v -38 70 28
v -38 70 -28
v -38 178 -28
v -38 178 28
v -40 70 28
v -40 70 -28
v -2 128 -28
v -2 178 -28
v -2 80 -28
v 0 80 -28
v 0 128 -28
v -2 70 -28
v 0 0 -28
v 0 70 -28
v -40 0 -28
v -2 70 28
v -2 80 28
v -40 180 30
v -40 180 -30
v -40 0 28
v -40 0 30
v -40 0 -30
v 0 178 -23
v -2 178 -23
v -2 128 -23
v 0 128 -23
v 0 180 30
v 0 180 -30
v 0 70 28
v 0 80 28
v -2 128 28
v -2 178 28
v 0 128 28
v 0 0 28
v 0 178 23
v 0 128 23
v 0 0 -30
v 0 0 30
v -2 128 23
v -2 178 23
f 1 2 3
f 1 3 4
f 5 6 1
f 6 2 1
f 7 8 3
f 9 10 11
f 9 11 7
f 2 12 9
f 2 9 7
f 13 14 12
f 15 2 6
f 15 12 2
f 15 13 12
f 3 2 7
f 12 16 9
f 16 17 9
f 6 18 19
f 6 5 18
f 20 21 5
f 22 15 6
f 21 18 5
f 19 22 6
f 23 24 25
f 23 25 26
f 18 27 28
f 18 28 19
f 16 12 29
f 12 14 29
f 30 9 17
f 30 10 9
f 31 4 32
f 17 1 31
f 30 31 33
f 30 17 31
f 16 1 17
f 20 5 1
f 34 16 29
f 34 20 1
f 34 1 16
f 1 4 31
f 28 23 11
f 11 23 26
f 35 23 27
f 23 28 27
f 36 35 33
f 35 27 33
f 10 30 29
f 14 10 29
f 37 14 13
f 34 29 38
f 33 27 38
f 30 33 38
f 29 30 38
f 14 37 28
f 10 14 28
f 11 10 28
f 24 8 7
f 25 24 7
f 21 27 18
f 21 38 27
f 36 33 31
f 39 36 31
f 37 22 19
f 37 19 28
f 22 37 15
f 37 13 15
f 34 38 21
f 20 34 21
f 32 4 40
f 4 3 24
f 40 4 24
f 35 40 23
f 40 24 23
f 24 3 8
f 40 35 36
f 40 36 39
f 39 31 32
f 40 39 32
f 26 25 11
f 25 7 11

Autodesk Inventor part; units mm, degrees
ref_plane "YZ Plane" through (0, 0, 0) normal (1, 0, 0) x (0, 1, 0)
ref_plane "XZ Plane" through (0, 0, 0) normal (0, 1, 0) x (-1, 0, 0)
ref_plane "XY Plane" through (0, 0, 0) normal (0, 0, 1) x (1, 0, 0)
sketch "Sketch1" plane through (0, 0, 0) normal (0, 1, 0) x (-1, 0, 0)
  line L0 (0, -28) -> (38, -28)
  line L1 (38, -28) -> (38, 28)
  line L2 (38, 28) -> (0, 28)
  line L3 (0, 28) -> (0, -28) construction
  line L4 (0, 30) -> (40, 30)
  line L5 (40, 30) -> (40, -30)
  line L6 (40, -30) -> (0, -30)
  line L7 (0, 30) -> (0, 28)
  line L8 (0, -28) -> (0, -30)
  point P0 (0, 0)
  point P1 (0, 0)
  dimension "d0" = 40
  dimension "d1" = 60
  dimension "d2" = 2
  dimension "d3" = 38
extrude "Extrusion1" add sketch "Sketch1" along normal blind 180
sketch "Sketch2" plane through (0, 180, 0) normal (0, 1, 0) x (1, 0, 0)
  line L0 (-38, 28) -> (0, 28) projected
  line L1 (0, -30) -> (0, -28) projected
  line L2 (-38, 28) -> (0, 28)
  line L3 (0, 28) -> (0, -28)
  line L4 (0, -28) -> (-38, -28)
  line L5 (-38, -28) -> (-38, 28)
  point P0 (0, 0)
extrude "Extrusion2" add sketch "Sketch2" against normal blind 2
sketch "Sketch3" plane through (-38, 0, -28) normal (0, 0, 1) x (1, 0, 0)
  line L0 (38, 178) -> (36, 178)
  line L1 (36, 178) -> (36, 128)
  line L2 (36, 128) -> (38, 128)
  line L3 (38, 128) -> (38, 178)
  point P0 (38, 0)
  dimension "d8" = 2
  dimension "d9" = 50
extrude "Extrusion3" add sketch "Sketch3" along normal blind 5
mirror "Mirror1" about plane through (0, 0, 0) normal (0, 0, 1) of "Extrusion3"
sketch "Sketch4" plane through (-38, 0, 28) normal (1, 0, 0) x (0, 0, -1)
  line L0 (0, 0) -> (56, 0) projected
  line L1 (56, 0) -> (56, 178) projected
  line L2 (0, 0) -> (56, 0)
  line L3 (56, 0) -> (56, 70)
  line L4 (56, 70) -> (0, 70)
  line L5 (0, 70) -> (0, 0)
  point P0 (28, 0)
  dimension "d12" = 70
extrude "Extrusion4" cut sketch "Sketch4" against normal blind 5
sketch "Sketch5" plane through (0, 0, -30) normal (1, 0, 0) x (0, 0, -1)
  line L0 (-2, 70) -> (-58, 70) projected
  line L1 (-2, 0) -> (-2, 128) projected
  line L2 (-58, 70) -> (-2, 70)
  line L3 (-2, 70) -> (-2, 80)
  line L4 (-2, 80) -> (-58, 80)
  line L5 (-58, 80) -> (-58, 70)
  point P0 (-30, 0)
  dimension "d15" = 10
extrude "Extrusion5" add sketch "Sketch5" against normal blind 2
properties part number "Soporte_camara"
